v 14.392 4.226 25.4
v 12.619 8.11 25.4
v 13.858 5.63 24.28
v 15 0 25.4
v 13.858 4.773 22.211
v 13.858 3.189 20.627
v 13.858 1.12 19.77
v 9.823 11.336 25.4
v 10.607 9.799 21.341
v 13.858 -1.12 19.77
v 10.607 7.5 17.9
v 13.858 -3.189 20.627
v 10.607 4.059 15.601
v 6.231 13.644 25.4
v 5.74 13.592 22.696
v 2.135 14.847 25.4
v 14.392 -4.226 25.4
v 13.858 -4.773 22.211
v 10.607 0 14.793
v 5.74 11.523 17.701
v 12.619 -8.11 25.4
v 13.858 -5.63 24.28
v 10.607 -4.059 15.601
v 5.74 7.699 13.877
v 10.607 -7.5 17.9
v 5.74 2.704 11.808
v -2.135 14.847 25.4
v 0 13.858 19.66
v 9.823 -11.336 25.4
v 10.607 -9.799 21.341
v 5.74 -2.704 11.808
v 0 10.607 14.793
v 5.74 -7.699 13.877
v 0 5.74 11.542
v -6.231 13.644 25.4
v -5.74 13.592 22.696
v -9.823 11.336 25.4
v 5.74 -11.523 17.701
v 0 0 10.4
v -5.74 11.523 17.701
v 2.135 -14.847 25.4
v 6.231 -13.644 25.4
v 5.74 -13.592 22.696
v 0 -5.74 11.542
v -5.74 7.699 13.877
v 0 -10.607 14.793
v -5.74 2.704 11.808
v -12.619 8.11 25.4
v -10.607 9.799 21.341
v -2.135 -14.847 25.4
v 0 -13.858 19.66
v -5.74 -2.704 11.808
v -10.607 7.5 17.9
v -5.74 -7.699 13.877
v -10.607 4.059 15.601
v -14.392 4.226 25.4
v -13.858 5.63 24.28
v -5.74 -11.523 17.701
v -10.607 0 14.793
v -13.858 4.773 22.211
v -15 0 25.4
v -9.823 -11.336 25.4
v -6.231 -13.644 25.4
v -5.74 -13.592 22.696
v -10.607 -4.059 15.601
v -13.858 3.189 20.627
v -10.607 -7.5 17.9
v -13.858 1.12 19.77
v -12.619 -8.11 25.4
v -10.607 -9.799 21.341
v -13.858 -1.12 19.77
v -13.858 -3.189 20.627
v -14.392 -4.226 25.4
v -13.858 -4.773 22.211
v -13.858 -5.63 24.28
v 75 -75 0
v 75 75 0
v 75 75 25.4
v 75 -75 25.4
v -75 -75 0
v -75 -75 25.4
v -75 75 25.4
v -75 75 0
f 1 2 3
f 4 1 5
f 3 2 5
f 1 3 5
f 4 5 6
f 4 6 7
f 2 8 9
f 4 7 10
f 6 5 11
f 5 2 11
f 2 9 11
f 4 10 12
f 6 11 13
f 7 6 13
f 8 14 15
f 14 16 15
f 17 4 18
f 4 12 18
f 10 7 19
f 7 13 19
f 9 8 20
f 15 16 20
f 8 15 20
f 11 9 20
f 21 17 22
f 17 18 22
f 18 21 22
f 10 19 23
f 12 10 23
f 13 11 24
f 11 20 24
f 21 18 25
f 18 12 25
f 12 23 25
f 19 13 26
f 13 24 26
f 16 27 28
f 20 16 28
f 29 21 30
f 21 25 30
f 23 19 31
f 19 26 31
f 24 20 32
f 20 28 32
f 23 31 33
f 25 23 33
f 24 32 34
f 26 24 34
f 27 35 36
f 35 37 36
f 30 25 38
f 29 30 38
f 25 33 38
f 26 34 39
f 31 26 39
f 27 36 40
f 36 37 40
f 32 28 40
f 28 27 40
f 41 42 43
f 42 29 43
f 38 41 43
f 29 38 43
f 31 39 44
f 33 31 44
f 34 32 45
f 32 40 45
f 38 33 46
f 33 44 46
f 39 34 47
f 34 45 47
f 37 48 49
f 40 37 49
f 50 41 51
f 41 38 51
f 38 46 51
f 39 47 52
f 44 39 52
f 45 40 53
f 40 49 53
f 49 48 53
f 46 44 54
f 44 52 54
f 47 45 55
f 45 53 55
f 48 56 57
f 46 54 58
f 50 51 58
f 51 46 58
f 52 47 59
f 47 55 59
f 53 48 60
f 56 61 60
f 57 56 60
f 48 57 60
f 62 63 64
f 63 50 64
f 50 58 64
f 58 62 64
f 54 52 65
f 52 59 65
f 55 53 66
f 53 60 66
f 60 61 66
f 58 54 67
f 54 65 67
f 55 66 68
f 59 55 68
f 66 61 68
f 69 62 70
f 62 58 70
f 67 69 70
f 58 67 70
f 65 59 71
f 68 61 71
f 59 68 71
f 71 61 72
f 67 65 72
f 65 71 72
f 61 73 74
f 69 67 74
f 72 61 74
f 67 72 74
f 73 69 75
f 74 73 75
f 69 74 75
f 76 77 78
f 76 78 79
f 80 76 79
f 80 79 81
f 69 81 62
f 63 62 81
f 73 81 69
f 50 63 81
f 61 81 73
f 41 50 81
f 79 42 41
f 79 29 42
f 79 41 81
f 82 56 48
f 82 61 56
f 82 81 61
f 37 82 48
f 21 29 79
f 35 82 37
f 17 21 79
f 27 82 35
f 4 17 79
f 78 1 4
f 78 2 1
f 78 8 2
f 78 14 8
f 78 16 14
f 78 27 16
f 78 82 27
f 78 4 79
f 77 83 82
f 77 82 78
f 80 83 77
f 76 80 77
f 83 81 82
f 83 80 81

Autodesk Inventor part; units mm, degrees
sketch "Boceto1" plane through (0, 0, 0) normal (0, 0, 1) x (1, 0, 0)
  line L0 (-75, 75) -> (75, 75)
  line L1 (75, 75) -> (75, -75)
  line L2 (75, -75) -> (-75, -75)
  line L3 (-75, -75) -> (-75, 75)
  line L4 (-75, 75) -> (75, -75) construction
  line L5 (75, 75) -> (-75, -75) construction
  point P0 (0, 0)
  dimension "d0" = 150
  dimension "d1" = 150
extrude "Extrusión1" add sketch "Boceto1" along normal blind 25.4
sketch "Boceto3" plane through (0, 0, 0) normal (0, 1, 0) x (-1, 0, 0)
  line L0 (-75, 25.4) -> (75, 25.4) projected
  arc A0 (-15, 25.4) -> (15, 25.4) centre (0, 25.4) ccw
  line L1 (15, 25.4) -> (-15, 25.4)
  point P0 (0, 0)
  dimension "d7" = 15
revolve "Revolución2" cut sketch "Boceto3" angle 360 about axis through (75, 0, 25.4) along (-1, 0, 0)
properties part number "Placa - Bolsillo Esfera Radio 15 mm"
